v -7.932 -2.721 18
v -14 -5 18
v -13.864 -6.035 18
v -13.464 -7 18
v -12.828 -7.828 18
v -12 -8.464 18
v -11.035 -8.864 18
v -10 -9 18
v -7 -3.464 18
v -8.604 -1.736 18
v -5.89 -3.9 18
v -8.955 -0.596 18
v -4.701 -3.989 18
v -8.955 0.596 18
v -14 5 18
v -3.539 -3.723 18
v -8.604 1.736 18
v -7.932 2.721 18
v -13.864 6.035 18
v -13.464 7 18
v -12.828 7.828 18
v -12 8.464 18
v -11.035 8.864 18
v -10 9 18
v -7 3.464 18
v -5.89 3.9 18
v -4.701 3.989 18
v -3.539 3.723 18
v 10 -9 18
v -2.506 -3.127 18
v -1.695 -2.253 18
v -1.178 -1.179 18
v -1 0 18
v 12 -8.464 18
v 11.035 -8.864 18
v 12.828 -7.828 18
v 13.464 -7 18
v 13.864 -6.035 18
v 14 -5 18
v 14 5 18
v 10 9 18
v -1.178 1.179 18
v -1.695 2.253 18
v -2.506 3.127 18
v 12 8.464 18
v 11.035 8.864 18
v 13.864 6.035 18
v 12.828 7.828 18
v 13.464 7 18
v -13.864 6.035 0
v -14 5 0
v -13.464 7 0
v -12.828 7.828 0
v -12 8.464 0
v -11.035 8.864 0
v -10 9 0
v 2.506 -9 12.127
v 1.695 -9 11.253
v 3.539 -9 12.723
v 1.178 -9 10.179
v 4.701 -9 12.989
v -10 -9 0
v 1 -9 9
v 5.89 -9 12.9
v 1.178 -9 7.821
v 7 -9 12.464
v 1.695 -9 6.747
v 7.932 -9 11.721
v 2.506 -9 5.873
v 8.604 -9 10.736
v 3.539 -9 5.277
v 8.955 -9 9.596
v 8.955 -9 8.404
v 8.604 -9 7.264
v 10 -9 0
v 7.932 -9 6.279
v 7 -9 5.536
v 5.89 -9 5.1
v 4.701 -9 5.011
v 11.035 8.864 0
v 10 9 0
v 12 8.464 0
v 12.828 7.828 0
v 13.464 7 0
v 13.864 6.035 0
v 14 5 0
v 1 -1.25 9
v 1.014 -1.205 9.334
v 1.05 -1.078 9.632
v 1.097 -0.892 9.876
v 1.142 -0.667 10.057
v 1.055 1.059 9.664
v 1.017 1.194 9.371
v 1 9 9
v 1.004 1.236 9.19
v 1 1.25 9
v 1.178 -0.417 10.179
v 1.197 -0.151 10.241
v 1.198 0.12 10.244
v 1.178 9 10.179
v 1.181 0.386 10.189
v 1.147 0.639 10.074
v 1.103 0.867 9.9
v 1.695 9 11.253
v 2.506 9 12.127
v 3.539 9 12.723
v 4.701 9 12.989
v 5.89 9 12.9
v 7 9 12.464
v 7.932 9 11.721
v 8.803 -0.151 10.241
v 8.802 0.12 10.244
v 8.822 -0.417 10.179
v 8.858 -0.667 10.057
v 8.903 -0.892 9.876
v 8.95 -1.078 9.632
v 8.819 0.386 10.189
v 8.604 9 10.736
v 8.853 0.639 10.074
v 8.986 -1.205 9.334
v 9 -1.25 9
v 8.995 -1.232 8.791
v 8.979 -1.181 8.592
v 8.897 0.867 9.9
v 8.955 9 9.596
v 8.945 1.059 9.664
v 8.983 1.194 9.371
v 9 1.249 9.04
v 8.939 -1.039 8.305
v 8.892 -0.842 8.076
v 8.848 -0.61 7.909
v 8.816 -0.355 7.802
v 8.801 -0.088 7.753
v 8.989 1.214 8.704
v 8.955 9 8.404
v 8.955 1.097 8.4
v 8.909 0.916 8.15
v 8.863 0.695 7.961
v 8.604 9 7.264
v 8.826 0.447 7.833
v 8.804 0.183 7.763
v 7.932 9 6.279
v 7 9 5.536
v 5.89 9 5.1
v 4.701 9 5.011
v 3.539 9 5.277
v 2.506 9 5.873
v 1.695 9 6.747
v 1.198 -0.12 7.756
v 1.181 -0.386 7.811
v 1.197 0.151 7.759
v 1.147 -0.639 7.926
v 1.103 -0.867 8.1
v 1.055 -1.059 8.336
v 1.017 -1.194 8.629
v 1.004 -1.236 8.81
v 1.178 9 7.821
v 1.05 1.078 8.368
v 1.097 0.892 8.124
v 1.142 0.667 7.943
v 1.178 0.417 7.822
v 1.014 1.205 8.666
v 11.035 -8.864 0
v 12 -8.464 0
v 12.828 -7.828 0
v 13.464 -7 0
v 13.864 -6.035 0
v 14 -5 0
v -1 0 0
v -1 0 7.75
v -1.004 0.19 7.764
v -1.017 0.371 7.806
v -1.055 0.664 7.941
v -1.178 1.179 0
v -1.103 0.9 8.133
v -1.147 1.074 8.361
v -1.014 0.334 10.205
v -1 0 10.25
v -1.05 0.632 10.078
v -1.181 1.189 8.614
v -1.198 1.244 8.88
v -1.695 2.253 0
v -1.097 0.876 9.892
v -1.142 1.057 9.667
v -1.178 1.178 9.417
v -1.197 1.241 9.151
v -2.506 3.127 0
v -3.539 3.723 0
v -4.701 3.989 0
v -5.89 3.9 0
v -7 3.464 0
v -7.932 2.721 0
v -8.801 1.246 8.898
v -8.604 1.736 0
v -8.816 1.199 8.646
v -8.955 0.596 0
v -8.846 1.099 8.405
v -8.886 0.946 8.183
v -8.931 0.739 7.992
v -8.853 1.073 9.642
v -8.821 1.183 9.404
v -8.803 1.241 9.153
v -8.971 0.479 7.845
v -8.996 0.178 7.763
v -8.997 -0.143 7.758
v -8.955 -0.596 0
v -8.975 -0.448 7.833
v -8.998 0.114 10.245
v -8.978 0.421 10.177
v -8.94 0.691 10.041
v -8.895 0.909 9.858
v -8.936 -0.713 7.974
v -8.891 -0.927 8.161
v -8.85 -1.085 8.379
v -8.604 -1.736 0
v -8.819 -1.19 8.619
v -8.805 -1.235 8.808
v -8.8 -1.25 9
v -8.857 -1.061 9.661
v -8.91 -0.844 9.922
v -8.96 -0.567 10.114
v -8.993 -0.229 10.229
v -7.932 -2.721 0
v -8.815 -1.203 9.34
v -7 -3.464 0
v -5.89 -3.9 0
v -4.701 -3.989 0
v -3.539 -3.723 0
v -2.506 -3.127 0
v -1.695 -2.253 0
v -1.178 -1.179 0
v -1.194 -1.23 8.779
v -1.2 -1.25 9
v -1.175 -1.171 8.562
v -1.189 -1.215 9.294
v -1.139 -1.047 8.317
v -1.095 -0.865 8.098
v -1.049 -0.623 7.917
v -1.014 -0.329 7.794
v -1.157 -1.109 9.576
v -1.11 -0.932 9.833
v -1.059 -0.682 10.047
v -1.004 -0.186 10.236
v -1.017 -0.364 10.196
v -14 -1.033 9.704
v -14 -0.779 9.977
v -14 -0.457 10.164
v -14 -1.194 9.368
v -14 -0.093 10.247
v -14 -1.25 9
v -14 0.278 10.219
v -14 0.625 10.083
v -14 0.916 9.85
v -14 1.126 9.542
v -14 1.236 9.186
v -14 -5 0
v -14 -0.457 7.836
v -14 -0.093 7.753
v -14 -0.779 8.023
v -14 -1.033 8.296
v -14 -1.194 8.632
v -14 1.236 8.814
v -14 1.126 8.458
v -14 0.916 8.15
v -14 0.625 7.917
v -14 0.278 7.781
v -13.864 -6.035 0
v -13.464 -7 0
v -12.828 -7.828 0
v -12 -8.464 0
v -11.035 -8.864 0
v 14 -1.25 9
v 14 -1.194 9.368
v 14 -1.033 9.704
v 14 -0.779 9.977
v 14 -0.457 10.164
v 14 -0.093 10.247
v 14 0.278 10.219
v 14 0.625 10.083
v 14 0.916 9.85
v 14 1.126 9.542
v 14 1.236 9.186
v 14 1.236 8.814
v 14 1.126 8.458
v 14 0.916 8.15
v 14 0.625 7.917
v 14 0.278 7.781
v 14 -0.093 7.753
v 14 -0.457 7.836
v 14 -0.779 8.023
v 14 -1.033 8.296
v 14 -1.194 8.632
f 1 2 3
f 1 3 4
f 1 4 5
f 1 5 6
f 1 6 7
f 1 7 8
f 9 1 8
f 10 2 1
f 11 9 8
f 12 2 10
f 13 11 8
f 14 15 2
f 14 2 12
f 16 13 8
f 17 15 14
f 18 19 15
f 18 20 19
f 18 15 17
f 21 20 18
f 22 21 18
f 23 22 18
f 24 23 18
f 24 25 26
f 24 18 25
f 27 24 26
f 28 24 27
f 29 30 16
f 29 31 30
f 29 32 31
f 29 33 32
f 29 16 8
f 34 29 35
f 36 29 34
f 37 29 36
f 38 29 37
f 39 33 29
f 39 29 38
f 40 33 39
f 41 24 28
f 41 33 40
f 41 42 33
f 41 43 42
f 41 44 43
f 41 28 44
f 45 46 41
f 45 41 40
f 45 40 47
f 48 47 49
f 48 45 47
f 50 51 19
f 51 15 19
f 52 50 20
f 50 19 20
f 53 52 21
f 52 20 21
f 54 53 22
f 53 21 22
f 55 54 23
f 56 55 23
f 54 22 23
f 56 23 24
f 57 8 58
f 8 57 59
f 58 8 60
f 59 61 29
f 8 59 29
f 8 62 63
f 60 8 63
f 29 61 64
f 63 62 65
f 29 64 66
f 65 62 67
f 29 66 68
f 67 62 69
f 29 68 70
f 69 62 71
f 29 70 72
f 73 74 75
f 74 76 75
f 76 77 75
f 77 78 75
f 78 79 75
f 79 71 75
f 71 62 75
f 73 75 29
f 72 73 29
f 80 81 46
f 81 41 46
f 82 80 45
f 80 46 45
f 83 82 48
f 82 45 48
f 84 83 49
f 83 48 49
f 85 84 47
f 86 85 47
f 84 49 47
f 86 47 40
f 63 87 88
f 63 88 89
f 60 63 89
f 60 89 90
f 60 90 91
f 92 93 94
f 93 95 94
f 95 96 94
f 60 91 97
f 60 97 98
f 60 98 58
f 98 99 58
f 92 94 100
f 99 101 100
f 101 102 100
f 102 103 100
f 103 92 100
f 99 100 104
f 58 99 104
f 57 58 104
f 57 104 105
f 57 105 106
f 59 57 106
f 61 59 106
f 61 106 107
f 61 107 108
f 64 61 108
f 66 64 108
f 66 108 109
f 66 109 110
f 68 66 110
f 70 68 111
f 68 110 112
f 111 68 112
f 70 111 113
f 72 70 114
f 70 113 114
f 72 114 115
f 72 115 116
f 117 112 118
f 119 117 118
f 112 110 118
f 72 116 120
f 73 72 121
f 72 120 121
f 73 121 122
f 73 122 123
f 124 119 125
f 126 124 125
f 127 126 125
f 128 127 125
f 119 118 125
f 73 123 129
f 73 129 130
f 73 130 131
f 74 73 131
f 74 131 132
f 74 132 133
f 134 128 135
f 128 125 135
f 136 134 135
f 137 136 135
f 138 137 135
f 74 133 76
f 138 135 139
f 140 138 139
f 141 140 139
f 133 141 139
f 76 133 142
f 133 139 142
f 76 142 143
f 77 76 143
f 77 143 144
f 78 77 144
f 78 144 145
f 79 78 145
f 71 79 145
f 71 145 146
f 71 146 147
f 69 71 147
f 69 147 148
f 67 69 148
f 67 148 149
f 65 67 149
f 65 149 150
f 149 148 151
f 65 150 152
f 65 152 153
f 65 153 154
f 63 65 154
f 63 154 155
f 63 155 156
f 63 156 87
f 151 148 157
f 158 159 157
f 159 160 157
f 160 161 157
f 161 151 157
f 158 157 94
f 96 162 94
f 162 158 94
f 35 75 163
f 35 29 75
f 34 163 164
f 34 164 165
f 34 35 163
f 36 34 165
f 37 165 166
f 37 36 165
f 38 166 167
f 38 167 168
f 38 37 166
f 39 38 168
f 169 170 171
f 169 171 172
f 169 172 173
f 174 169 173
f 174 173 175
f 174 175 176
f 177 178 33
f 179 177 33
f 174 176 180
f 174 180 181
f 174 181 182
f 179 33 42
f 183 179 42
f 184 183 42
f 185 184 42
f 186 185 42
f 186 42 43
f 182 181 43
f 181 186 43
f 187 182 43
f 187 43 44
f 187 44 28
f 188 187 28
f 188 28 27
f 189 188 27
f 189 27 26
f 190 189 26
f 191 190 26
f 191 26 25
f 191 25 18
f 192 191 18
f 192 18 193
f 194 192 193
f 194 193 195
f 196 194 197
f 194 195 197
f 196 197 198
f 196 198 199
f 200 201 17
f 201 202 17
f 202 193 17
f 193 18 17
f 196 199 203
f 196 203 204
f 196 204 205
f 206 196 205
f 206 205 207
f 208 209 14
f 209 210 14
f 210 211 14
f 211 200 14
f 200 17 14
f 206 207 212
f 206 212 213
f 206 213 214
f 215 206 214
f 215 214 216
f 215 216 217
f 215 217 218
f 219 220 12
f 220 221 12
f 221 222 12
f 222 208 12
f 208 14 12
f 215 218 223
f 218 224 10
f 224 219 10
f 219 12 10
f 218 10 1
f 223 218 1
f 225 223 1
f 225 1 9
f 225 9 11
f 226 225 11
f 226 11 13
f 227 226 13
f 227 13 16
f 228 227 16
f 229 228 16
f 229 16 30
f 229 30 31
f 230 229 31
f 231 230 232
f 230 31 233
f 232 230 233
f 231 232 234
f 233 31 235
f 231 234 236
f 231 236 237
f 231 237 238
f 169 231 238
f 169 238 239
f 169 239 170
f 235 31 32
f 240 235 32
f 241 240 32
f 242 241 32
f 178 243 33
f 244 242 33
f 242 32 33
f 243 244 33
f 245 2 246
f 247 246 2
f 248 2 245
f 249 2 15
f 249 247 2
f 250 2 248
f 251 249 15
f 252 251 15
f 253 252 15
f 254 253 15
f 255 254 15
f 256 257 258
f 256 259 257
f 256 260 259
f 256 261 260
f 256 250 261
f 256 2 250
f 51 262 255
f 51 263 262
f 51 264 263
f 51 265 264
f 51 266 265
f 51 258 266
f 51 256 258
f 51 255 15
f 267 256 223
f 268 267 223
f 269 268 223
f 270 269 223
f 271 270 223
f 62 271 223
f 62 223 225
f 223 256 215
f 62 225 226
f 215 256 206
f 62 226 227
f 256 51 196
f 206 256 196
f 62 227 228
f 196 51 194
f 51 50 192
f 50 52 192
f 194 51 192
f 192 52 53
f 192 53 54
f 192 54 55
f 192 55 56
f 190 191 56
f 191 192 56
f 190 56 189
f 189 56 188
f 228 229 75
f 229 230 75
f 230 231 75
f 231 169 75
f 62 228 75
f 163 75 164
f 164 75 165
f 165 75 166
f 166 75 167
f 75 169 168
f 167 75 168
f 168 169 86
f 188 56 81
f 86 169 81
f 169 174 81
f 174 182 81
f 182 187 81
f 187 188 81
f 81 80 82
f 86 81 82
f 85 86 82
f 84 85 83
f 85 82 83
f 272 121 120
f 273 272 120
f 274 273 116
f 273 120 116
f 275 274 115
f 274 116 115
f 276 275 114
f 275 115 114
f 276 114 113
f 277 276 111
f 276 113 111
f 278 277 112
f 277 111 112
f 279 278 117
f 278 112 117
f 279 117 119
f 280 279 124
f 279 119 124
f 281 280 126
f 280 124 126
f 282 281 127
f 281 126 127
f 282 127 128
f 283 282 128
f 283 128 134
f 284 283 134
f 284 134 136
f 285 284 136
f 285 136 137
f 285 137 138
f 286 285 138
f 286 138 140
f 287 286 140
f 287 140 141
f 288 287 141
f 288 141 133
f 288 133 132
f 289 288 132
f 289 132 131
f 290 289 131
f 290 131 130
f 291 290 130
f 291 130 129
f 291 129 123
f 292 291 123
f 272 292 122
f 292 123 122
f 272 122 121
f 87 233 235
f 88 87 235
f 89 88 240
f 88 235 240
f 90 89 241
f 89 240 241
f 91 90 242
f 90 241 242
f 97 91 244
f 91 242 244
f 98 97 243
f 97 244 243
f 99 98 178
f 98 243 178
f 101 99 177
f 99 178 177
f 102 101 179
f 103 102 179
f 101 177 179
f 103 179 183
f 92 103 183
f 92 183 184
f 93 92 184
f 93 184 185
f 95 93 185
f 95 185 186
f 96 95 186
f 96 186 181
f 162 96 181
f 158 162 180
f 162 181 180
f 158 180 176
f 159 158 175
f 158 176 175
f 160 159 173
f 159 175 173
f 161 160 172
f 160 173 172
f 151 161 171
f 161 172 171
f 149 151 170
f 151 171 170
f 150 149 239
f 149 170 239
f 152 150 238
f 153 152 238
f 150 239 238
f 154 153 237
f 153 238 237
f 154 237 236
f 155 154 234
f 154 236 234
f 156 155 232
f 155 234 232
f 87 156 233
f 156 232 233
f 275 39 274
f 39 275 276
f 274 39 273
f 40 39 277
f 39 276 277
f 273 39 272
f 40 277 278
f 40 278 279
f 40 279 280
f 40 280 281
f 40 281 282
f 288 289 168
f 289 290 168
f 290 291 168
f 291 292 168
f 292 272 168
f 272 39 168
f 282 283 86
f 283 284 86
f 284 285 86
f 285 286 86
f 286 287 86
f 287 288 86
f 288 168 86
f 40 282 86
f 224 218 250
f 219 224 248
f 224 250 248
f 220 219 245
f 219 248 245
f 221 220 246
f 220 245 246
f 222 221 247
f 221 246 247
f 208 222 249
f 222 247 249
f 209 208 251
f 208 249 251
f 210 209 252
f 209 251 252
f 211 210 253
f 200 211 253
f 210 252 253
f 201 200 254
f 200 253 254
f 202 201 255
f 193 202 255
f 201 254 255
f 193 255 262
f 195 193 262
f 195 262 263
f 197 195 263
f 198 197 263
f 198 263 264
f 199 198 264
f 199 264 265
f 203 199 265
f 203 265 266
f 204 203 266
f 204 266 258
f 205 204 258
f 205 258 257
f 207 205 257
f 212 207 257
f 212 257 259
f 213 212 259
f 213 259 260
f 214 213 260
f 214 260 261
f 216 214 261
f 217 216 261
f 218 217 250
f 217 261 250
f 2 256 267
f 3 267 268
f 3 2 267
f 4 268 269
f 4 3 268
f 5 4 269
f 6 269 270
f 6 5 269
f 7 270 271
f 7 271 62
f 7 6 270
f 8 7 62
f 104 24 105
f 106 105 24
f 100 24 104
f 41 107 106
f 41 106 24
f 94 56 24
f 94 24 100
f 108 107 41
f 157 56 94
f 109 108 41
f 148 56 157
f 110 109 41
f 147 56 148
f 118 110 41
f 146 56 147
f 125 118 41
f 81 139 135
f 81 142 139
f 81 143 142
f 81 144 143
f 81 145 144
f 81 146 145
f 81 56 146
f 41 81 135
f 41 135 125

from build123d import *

# Parameters (mm, degrees)
F0_W     = 28
F0_H     = 18
F1_DEPTH = 18
F2_R     = 4
F4_DEPTH = 18.001
F3_R     = 4
F5_DEPTH = 18.001
F6_R     = 1.25
F7_DEPTH = 28.001
F8_R     = 4


with BuildPart() as f1:
    # F0 (on Top) → F1 (new body)
    with BuildSketch(Plane.XY):
        Rectangle(F0_W, F0_H)
    extrude(amount=F1_DEPTH)

    # F2 (on face) → F4 (cut, through all)
    with BuildSketch(Plane.XY.offset(18)):
        with Locations((-5, 0)):
            Circle(F2_R)
    extrude(amount=-F4_DEPTH, mode=Mode.SUBTRACT)

    # F3 (on face) → F5 (cut, through all)
    with BuildSketch(Plane(origin=(0, 9, 0), x_dir=(-1, 0, 0), z_dir=(0, 1, 0))):
        with Locations((-5, 9)):
            Circle(F3_R)
    extrude(amount=-F5_DEPTH, mode=Mode.SUBTRACT)

    # F6 (on face) → F7 (cut, through all)
    with BuildSketch(Plane(origin=(-14, 0, 0), x_dir=(0, -1, 0), z_dir=(-1, 0, 0))):
        with Locations((0, 9)):
            Circle(F6_R)
    extrude(amount=-F7_DEPTH, mode=Mode.SUBTRACT)

    # F8
    f8_edges = [f1.edges().sort_by_distance(p)[0] for p in [
        (-14, -9, 9),
        (-14, 9, 9),
        (14, -9, 9),
        (14, 9, 9),
    ]]
    fillet(f8_edges, radius=F8_R)


solid = f1.part
